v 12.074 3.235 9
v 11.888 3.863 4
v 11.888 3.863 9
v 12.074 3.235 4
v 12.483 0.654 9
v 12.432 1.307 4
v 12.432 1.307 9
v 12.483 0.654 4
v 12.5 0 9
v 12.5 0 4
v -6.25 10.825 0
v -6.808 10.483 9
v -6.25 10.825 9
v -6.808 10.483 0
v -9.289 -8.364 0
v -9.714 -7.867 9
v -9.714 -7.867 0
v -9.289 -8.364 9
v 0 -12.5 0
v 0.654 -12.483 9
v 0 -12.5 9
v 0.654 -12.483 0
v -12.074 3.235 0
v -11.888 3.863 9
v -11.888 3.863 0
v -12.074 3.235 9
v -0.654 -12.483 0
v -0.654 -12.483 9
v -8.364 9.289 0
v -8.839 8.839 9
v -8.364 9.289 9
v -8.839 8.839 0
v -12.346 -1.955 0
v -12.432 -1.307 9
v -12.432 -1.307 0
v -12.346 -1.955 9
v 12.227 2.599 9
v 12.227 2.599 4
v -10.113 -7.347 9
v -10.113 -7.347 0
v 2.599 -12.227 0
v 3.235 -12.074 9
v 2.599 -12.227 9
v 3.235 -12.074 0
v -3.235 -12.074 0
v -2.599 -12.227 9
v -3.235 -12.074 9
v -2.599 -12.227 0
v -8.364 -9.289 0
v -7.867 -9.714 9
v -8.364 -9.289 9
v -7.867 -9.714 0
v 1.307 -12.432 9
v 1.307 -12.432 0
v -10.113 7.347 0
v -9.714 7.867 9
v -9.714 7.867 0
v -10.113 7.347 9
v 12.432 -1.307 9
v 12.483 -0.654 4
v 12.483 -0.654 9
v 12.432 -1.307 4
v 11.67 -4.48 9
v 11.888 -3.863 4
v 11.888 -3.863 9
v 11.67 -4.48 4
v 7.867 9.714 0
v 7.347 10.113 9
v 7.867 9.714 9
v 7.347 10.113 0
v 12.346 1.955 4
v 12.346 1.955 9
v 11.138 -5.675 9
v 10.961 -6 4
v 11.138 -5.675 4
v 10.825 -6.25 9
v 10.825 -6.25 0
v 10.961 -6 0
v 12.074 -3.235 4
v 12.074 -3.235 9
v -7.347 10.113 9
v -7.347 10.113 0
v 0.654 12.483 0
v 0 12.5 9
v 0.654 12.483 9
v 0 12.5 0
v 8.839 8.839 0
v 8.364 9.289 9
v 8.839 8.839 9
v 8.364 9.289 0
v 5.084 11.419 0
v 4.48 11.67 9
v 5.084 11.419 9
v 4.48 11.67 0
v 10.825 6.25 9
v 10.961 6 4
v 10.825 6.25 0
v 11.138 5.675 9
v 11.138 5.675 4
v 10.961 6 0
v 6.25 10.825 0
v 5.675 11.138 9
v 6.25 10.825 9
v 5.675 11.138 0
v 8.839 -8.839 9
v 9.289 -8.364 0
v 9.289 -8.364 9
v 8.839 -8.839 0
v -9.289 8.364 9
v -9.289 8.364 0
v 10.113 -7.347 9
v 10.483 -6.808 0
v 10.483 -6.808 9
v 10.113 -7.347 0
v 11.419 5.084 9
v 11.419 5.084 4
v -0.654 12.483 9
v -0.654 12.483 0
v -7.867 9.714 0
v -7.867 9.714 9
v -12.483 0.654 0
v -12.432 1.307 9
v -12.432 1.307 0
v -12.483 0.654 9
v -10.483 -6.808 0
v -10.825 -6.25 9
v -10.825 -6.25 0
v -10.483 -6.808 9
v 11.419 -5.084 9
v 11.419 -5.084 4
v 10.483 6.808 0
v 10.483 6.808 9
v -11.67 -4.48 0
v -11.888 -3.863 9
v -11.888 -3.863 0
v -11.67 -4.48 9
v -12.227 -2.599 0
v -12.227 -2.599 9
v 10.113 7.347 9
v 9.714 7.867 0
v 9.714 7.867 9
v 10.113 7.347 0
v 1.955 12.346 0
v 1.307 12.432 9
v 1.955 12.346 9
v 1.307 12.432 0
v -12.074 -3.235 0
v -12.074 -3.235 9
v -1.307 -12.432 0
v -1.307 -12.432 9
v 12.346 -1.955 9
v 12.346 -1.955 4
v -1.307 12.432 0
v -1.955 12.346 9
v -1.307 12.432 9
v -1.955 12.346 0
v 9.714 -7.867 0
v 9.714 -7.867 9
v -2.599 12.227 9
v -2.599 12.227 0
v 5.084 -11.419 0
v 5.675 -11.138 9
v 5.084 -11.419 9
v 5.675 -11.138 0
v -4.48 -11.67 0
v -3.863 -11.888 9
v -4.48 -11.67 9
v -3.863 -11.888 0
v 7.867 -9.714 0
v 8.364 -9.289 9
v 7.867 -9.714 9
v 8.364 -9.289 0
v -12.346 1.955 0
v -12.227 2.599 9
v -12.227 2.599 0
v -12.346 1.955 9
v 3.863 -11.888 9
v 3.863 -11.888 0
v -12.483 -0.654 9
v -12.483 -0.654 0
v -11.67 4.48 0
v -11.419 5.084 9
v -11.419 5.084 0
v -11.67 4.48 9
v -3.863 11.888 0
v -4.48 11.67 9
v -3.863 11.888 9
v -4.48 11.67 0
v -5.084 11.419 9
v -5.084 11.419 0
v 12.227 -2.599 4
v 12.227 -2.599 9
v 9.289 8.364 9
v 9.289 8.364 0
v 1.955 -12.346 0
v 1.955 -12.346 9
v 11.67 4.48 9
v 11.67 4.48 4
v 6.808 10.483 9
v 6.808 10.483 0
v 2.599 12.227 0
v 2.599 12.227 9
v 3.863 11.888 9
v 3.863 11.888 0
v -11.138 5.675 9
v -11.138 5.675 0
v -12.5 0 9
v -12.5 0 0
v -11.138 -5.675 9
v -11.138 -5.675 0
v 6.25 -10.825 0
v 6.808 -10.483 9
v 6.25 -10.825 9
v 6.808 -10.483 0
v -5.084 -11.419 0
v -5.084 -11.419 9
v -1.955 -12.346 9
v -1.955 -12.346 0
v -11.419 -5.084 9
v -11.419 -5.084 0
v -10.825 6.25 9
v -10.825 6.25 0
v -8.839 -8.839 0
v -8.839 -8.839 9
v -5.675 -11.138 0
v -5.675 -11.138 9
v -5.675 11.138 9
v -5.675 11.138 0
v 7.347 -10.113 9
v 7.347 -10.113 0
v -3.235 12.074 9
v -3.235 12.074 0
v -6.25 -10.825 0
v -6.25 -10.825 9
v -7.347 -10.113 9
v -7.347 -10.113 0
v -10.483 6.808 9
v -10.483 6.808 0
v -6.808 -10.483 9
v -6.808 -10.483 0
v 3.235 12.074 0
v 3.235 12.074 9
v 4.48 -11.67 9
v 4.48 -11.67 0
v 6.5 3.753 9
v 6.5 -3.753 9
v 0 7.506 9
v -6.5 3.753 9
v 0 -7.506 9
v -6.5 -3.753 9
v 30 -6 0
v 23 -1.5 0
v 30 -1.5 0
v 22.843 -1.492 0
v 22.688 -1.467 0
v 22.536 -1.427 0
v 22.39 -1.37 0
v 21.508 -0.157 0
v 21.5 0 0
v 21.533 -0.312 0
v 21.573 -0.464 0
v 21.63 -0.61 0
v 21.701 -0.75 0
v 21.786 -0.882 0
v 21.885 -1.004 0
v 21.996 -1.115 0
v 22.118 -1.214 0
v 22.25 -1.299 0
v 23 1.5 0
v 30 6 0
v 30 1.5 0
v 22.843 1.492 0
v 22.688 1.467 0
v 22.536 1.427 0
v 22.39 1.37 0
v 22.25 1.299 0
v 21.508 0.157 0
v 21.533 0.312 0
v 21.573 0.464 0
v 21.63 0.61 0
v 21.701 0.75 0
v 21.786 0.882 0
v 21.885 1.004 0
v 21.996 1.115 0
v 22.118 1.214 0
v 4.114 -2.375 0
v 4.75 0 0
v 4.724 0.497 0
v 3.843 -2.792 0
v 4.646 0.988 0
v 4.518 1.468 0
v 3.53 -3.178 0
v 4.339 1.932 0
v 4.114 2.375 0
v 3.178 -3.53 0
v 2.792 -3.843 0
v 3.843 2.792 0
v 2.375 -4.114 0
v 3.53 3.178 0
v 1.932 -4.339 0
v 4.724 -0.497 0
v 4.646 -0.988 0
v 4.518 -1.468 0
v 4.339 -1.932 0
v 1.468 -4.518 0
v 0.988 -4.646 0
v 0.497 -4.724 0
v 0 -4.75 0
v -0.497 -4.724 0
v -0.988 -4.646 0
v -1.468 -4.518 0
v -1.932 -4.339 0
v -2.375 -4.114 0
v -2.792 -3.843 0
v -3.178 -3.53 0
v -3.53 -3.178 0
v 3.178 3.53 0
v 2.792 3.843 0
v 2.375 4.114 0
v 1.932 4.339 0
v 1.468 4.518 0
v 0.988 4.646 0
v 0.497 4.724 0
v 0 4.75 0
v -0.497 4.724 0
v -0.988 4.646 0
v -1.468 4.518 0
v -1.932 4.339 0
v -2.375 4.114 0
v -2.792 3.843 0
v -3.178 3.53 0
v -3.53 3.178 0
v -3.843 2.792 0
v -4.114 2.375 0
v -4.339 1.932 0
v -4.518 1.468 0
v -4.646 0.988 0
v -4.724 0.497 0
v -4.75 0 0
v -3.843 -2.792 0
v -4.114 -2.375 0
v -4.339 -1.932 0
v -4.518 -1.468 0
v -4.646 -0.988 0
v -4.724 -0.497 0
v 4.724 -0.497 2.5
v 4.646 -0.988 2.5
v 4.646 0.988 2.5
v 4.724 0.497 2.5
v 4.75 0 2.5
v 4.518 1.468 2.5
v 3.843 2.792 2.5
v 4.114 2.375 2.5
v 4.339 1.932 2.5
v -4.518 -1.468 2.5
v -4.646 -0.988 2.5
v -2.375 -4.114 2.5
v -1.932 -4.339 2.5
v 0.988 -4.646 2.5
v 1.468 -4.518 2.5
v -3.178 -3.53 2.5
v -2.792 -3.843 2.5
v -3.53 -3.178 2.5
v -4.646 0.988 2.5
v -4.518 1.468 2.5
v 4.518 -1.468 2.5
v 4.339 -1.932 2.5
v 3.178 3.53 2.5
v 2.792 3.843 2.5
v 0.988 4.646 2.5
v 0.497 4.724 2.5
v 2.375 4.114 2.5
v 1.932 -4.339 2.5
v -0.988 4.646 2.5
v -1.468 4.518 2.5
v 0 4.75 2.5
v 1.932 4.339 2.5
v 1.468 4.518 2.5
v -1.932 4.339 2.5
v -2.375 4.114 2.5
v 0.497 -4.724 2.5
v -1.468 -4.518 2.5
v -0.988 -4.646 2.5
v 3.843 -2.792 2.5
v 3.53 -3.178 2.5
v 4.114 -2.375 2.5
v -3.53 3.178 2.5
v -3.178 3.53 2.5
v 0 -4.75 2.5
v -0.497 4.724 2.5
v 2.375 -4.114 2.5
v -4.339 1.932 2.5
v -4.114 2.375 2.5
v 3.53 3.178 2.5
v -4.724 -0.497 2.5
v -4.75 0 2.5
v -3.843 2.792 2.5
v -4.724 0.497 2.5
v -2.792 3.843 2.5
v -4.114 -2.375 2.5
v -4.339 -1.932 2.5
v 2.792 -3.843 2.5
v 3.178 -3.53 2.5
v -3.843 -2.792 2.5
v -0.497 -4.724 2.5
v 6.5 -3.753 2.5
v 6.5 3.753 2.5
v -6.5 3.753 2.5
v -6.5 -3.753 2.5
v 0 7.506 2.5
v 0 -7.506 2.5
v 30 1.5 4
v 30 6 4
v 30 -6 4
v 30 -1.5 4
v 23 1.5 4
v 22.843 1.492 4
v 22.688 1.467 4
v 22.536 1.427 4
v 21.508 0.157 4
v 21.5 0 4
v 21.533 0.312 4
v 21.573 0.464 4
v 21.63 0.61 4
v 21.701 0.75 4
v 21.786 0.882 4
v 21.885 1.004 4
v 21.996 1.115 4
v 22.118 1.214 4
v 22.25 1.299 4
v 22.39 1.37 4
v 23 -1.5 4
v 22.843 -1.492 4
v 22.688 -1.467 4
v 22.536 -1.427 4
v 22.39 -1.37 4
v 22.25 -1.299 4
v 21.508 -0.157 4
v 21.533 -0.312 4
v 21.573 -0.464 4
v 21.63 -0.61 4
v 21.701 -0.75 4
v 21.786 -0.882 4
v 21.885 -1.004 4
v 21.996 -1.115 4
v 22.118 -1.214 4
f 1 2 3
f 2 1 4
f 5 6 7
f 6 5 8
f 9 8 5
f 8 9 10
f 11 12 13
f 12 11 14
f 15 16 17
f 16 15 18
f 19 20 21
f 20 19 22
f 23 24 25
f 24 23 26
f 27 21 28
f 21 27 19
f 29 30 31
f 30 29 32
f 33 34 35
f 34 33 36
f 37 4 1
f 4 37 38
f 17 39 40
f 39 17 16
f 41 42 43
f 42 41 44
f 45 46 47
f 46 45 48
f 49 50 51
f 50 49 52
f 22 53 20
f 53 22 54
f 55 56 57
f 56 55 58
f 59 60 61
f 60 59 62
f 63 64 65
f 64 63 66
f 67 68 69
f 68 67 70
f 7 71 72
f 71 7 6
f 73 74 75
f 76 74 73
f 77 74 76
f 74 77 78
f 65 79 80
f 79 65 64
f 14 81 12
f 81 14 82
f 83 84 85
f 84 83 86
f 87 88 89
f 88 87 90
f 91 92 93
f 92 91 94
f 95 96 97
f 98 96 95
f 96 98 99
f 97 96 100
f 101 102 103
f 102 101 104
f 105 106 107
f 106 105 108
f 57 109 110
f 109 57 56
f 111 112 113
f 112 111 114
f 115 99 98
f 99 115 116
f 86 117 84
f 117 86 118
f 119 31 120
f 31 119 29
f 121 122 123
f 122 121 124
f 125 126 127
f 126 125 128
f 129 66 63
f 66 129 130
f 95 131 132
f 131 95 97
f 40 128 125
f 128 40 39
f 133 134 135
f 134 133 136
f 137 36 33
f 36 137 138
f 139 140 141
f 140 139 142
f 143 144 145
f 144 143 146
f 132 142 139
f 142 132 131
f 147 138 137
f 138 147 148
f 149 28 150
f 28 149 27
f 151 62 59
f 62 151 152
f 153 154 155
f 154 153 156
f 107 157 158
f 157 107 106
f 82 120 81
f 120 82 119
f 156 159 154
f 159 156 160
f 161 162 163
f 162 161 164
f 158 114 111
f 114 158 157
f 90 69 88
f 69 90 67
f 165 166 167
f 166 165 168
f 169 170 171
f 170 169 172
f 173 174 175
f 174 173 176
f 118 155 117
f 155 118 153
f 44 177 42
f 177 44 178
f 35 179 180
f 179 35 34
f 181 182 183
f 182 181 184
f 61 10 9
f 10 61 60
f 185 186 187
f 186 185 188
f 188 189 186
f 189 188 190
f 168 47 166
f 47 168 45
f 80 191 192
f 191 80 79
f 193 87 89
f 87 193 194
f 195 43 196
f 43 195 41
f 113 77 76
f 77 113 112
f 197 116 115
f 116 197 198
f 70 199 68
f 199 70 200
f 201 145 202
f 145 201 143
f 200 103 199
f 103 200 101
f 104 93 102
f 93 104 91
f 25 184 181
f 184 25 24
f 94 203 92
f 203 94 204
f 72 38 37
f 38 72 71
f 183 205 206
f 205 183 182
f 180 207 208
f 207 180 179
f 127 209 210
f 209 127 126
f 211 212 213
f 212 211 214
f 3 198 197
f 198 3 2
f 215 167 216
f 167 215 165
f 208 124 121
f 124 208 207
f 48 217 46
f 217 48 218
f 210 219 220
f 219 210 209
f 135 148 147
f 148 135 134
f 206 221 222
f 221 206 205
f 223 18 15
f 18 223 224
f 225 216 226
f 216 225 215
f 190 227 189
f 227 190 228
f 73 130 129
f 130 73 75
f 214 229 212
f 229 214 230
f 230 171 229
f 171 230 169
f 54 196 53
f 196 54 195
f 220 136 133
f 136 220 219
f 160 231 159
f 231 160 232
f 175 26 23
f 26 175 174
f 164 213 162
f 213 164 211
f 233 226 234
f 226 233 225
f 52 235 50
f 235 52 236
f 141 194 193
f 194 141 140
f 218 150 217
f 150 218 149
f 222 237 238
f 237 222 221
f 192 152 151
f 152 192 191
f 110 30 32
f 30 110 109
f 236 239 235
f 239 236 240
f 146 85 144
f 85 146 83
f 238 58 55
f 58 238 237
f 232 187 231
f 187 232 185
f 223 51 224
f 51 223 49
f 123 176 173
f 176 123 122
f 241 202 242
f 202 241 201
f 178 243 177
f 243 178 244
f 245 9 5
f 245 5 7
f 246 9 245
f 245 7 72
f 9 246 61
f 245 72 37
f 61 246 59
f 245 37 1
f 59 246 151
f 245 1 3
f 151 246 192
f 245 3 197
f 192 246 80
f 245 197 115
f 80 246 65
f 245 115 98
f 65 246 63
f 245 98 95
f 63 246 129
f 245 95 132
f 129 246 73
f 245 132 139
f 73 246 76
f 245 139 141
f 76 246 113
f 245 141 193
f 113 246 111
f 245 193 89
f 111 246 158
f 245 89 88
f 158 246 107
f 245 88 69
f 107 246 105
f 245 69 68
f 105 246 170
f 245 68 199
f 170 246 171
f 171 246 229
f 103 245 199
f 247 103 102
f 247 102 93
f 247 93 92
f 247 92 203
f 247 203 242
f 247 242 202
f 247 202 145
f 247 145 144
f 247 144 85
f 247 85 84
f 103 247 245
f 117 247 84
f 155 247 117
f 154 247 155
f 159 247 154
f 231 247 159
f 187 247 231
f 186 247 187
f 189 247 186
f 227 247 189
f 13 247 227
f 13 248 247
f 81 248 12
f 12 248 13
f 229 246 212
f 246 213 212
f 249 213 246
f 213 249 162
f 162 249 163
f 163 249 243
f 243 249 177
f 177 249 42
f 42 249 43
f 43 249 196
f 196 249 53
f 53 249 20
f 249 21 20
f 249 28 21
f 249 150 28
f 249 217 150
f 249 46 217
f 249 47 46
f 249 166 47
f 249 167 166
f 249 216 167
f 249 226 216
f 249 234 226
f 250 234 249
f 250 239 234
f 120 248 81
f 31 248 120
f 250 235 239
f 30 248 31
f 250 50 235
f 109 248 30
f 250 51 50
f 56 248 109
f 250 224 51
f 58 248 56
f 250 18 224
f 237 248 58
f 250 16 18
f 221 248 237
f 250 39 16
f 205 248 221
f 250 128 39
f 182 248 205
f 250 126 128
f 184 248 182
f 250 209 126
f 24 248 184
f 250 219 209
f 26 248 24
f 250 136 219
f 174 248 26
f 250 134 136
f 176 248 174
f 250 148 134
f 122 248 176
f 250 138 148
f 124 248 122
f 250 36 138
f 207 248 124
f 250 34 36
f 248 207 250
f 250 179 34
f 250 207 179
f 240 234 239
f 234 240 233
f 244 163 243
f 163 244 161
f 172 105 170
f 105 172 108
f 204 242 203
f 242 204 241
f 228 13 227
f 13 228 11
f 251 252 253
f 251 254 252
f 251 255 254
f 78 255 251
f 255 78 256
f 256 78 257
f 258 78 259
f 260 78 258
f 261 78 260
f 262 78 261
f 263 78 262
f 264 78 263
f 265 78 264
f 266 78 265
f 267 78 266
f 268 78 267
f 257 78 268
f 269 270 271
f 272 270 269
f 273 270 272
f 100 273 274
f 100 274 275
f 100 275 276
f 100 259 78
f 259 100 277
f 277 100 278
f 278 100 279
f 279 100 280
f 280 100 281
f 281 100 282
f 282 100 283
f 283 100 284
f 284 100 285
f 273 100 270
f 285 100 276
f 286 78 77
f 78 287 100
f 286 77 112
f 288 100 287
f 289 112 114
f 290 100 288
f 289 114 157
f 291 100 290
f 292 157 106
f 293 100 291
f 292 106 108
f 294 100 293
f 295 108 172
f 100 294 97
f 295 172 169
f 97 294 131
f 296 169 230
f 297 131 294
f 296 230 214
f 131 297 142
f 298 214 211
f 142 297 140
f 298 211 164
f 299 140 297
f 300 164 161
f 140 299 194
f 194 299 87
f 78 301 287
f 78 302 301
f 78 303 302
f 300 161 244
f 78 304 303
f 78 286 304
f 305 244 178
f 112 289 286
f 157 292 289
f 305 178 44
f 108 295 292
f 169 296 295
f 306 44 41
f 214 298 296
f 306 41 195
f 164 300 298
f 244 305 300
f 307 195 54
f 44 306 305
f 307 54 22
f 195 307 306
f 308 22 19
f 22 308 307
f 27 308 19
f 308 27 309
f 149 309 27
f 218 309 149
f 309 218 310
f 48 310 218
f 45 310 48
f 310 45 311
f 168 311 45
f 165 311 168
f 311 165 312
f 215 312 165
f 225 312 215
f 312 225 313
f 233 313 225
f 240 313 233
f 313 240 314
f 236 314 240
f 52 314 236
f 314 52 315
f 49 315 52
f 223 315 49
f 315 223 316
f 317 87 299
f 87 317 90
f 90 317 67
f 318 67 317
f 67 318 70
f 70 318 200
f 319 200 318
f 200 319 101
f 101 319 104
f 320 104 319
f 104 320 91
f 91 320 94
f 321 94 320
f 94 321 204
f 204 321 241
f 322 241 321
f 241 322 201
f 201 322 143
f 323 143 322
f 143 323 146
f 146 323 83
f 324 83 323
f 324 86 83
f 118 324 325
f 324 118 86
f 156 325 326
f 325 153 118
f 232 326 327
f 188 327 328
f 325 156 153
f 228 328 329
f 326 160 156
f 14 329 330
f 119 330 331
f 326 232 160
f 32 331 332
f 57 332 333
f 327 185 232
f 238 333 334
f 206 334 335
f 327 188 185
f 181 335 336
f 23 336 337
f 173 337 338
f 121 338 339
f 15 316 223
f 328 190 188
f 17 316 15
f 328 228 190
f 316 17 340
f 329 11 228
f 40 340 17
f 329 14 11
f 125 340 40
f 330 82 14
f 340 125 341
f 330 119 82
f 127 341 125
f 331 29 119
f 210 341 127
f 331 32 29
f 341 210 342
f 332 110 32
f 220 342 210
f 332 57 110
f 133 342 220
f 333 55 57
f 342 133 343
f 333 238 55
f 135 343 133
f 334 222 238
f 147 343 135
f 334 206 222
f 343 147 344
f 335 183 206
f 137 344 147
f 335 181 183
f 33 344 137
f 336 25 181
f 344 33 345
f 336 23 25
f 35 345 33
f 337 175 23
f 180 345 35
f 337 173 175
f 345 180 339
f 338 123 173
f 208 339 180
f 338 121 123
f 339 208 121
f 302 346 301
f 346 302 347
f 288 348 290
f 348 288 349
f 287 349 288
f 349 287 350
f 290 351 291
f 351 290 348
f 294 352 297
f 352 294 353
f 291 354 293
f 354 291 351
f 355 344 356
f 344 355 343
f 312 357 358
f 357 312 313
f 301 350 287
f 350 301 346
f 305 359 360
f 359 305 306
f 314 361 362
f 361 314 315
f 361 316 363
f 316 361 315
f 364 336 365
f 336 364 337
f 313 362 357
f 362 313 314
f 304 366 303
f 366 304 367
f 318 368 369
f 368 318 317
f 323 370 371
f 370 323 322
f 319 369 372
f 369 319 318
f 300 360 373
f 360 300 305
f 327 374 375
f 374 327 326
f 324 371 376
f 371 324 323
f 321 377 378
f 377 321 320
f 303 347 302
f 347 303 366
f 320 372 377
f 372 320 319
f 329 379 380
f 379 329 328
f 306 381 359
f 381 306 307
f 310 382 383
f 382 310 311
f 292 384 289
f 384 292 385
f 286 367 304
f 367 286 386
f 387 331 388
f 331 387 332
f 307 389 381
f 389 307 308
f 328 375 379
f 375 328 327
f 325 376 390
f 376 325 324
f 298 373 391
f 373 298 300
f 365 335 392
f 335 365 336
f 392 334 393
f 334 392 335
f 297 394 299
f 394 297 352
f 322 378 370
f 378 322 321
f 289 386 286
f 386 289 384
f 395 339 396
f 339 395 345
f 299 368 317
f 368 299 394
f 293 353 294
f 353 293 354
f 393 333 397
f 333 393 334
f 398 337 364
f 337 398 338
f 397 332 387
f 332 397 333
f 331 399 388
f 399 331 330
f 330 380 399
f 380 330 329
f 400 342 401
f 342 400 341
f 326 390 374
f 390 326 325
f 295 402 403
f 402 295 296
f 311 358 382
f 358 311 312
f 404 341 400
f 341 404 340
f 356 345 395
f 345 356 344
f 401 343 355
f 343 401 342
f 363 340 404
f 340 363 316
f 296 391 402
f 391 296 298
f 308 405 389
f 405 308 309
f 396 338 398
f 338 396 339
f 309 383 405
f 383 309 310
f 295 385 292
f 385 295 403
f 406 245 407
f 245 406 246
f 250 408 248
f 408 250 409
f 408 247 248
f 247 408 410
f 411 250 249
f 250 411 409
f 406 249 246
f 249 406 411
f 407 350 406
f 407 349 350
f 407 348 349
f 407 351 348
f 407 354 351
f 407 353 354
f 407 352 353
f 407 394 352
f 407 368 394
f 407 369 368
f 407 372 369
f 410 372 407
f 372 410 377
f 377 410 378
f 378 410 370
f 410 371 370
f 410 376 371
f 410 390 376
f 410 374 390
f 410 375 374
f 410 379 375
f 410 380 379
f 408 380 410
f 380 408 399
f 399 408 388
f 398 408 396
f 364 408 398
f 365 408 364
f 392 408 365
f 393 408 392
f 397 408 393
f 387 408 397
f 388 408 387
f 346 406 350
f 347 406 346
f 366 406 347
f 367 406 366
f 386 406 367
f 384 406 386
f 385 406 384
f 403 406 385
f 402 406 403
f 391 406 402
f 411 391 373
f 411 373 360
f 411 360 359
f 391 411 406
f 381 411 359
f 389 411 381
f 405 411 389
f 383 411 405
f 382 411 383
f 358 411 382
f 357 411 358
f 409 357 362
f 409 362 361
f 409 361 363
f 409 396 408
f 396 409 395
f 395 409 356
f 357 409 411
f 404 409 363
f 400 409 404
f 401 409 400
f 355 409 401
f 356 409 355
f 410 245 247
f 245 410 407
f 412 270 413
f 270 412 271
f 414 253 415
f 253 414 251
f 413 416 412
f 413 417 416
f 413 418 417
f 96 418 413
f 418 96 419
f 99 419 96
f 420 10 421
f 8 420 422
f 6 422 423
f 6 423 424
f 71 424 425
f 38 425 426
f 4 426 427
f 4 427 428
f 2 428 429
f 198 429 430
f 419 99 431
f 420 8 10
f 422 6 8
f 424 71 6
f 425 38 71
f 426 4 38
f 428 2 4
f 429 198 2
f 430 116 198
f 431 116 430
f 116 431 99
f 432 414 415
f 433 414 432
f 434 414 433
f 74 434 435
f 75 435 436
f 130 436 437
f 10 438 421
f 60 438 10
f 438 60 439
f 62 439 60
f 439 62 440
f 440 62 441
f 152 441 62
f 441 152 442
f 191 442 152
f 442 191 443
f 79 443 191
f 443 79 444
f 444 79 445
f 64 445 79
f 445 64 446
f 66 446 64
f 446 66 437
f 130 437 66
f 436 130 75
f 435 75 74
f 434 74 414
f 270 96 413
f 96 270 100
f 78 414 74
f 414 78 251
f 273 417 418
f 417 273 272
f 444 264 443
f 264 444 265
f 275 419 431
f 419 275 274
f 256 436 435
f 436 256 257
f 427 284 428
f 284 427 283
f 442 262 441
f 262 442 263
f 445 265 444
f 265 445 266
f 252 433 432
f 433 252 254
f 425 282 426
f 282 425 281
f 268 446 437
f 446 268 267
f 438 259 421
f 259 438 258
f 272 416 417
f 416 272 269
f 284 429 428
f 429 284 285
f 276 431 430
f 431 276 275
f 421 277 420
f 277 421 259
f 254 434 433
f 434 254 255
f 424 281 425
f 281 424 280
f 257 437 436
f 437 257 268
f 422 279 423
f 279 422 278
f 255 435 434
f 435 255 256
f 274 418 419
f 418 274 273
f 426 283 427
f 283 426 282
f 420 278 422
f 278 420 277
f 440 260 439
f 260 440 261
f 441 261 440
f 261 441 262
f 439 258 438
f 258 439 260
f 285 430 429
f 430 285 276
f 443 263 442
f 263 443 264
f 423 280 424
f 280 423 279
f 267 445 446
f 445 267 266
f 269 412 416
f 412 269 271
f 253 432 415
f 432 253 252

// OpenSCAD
union(){
difference(){
cylinder(h=9,r=12.5,$fn=120);
translate([0,0,-1])cylinder(h=10,r=9.5/2,$fn=60);
rotate(90,[0,0,1])translate([0,0,2.5])cylinder(h=10,r=13/2/cos(30),$fn=6);
}
difference(){
translate([10,-6,0])cube([20,12,4]);
translate([23,0,-1])cylinder(r=1.5,h=12,$fn=60);
translate([23,-1.5,-1])cube([11,3,12]);
}
}
